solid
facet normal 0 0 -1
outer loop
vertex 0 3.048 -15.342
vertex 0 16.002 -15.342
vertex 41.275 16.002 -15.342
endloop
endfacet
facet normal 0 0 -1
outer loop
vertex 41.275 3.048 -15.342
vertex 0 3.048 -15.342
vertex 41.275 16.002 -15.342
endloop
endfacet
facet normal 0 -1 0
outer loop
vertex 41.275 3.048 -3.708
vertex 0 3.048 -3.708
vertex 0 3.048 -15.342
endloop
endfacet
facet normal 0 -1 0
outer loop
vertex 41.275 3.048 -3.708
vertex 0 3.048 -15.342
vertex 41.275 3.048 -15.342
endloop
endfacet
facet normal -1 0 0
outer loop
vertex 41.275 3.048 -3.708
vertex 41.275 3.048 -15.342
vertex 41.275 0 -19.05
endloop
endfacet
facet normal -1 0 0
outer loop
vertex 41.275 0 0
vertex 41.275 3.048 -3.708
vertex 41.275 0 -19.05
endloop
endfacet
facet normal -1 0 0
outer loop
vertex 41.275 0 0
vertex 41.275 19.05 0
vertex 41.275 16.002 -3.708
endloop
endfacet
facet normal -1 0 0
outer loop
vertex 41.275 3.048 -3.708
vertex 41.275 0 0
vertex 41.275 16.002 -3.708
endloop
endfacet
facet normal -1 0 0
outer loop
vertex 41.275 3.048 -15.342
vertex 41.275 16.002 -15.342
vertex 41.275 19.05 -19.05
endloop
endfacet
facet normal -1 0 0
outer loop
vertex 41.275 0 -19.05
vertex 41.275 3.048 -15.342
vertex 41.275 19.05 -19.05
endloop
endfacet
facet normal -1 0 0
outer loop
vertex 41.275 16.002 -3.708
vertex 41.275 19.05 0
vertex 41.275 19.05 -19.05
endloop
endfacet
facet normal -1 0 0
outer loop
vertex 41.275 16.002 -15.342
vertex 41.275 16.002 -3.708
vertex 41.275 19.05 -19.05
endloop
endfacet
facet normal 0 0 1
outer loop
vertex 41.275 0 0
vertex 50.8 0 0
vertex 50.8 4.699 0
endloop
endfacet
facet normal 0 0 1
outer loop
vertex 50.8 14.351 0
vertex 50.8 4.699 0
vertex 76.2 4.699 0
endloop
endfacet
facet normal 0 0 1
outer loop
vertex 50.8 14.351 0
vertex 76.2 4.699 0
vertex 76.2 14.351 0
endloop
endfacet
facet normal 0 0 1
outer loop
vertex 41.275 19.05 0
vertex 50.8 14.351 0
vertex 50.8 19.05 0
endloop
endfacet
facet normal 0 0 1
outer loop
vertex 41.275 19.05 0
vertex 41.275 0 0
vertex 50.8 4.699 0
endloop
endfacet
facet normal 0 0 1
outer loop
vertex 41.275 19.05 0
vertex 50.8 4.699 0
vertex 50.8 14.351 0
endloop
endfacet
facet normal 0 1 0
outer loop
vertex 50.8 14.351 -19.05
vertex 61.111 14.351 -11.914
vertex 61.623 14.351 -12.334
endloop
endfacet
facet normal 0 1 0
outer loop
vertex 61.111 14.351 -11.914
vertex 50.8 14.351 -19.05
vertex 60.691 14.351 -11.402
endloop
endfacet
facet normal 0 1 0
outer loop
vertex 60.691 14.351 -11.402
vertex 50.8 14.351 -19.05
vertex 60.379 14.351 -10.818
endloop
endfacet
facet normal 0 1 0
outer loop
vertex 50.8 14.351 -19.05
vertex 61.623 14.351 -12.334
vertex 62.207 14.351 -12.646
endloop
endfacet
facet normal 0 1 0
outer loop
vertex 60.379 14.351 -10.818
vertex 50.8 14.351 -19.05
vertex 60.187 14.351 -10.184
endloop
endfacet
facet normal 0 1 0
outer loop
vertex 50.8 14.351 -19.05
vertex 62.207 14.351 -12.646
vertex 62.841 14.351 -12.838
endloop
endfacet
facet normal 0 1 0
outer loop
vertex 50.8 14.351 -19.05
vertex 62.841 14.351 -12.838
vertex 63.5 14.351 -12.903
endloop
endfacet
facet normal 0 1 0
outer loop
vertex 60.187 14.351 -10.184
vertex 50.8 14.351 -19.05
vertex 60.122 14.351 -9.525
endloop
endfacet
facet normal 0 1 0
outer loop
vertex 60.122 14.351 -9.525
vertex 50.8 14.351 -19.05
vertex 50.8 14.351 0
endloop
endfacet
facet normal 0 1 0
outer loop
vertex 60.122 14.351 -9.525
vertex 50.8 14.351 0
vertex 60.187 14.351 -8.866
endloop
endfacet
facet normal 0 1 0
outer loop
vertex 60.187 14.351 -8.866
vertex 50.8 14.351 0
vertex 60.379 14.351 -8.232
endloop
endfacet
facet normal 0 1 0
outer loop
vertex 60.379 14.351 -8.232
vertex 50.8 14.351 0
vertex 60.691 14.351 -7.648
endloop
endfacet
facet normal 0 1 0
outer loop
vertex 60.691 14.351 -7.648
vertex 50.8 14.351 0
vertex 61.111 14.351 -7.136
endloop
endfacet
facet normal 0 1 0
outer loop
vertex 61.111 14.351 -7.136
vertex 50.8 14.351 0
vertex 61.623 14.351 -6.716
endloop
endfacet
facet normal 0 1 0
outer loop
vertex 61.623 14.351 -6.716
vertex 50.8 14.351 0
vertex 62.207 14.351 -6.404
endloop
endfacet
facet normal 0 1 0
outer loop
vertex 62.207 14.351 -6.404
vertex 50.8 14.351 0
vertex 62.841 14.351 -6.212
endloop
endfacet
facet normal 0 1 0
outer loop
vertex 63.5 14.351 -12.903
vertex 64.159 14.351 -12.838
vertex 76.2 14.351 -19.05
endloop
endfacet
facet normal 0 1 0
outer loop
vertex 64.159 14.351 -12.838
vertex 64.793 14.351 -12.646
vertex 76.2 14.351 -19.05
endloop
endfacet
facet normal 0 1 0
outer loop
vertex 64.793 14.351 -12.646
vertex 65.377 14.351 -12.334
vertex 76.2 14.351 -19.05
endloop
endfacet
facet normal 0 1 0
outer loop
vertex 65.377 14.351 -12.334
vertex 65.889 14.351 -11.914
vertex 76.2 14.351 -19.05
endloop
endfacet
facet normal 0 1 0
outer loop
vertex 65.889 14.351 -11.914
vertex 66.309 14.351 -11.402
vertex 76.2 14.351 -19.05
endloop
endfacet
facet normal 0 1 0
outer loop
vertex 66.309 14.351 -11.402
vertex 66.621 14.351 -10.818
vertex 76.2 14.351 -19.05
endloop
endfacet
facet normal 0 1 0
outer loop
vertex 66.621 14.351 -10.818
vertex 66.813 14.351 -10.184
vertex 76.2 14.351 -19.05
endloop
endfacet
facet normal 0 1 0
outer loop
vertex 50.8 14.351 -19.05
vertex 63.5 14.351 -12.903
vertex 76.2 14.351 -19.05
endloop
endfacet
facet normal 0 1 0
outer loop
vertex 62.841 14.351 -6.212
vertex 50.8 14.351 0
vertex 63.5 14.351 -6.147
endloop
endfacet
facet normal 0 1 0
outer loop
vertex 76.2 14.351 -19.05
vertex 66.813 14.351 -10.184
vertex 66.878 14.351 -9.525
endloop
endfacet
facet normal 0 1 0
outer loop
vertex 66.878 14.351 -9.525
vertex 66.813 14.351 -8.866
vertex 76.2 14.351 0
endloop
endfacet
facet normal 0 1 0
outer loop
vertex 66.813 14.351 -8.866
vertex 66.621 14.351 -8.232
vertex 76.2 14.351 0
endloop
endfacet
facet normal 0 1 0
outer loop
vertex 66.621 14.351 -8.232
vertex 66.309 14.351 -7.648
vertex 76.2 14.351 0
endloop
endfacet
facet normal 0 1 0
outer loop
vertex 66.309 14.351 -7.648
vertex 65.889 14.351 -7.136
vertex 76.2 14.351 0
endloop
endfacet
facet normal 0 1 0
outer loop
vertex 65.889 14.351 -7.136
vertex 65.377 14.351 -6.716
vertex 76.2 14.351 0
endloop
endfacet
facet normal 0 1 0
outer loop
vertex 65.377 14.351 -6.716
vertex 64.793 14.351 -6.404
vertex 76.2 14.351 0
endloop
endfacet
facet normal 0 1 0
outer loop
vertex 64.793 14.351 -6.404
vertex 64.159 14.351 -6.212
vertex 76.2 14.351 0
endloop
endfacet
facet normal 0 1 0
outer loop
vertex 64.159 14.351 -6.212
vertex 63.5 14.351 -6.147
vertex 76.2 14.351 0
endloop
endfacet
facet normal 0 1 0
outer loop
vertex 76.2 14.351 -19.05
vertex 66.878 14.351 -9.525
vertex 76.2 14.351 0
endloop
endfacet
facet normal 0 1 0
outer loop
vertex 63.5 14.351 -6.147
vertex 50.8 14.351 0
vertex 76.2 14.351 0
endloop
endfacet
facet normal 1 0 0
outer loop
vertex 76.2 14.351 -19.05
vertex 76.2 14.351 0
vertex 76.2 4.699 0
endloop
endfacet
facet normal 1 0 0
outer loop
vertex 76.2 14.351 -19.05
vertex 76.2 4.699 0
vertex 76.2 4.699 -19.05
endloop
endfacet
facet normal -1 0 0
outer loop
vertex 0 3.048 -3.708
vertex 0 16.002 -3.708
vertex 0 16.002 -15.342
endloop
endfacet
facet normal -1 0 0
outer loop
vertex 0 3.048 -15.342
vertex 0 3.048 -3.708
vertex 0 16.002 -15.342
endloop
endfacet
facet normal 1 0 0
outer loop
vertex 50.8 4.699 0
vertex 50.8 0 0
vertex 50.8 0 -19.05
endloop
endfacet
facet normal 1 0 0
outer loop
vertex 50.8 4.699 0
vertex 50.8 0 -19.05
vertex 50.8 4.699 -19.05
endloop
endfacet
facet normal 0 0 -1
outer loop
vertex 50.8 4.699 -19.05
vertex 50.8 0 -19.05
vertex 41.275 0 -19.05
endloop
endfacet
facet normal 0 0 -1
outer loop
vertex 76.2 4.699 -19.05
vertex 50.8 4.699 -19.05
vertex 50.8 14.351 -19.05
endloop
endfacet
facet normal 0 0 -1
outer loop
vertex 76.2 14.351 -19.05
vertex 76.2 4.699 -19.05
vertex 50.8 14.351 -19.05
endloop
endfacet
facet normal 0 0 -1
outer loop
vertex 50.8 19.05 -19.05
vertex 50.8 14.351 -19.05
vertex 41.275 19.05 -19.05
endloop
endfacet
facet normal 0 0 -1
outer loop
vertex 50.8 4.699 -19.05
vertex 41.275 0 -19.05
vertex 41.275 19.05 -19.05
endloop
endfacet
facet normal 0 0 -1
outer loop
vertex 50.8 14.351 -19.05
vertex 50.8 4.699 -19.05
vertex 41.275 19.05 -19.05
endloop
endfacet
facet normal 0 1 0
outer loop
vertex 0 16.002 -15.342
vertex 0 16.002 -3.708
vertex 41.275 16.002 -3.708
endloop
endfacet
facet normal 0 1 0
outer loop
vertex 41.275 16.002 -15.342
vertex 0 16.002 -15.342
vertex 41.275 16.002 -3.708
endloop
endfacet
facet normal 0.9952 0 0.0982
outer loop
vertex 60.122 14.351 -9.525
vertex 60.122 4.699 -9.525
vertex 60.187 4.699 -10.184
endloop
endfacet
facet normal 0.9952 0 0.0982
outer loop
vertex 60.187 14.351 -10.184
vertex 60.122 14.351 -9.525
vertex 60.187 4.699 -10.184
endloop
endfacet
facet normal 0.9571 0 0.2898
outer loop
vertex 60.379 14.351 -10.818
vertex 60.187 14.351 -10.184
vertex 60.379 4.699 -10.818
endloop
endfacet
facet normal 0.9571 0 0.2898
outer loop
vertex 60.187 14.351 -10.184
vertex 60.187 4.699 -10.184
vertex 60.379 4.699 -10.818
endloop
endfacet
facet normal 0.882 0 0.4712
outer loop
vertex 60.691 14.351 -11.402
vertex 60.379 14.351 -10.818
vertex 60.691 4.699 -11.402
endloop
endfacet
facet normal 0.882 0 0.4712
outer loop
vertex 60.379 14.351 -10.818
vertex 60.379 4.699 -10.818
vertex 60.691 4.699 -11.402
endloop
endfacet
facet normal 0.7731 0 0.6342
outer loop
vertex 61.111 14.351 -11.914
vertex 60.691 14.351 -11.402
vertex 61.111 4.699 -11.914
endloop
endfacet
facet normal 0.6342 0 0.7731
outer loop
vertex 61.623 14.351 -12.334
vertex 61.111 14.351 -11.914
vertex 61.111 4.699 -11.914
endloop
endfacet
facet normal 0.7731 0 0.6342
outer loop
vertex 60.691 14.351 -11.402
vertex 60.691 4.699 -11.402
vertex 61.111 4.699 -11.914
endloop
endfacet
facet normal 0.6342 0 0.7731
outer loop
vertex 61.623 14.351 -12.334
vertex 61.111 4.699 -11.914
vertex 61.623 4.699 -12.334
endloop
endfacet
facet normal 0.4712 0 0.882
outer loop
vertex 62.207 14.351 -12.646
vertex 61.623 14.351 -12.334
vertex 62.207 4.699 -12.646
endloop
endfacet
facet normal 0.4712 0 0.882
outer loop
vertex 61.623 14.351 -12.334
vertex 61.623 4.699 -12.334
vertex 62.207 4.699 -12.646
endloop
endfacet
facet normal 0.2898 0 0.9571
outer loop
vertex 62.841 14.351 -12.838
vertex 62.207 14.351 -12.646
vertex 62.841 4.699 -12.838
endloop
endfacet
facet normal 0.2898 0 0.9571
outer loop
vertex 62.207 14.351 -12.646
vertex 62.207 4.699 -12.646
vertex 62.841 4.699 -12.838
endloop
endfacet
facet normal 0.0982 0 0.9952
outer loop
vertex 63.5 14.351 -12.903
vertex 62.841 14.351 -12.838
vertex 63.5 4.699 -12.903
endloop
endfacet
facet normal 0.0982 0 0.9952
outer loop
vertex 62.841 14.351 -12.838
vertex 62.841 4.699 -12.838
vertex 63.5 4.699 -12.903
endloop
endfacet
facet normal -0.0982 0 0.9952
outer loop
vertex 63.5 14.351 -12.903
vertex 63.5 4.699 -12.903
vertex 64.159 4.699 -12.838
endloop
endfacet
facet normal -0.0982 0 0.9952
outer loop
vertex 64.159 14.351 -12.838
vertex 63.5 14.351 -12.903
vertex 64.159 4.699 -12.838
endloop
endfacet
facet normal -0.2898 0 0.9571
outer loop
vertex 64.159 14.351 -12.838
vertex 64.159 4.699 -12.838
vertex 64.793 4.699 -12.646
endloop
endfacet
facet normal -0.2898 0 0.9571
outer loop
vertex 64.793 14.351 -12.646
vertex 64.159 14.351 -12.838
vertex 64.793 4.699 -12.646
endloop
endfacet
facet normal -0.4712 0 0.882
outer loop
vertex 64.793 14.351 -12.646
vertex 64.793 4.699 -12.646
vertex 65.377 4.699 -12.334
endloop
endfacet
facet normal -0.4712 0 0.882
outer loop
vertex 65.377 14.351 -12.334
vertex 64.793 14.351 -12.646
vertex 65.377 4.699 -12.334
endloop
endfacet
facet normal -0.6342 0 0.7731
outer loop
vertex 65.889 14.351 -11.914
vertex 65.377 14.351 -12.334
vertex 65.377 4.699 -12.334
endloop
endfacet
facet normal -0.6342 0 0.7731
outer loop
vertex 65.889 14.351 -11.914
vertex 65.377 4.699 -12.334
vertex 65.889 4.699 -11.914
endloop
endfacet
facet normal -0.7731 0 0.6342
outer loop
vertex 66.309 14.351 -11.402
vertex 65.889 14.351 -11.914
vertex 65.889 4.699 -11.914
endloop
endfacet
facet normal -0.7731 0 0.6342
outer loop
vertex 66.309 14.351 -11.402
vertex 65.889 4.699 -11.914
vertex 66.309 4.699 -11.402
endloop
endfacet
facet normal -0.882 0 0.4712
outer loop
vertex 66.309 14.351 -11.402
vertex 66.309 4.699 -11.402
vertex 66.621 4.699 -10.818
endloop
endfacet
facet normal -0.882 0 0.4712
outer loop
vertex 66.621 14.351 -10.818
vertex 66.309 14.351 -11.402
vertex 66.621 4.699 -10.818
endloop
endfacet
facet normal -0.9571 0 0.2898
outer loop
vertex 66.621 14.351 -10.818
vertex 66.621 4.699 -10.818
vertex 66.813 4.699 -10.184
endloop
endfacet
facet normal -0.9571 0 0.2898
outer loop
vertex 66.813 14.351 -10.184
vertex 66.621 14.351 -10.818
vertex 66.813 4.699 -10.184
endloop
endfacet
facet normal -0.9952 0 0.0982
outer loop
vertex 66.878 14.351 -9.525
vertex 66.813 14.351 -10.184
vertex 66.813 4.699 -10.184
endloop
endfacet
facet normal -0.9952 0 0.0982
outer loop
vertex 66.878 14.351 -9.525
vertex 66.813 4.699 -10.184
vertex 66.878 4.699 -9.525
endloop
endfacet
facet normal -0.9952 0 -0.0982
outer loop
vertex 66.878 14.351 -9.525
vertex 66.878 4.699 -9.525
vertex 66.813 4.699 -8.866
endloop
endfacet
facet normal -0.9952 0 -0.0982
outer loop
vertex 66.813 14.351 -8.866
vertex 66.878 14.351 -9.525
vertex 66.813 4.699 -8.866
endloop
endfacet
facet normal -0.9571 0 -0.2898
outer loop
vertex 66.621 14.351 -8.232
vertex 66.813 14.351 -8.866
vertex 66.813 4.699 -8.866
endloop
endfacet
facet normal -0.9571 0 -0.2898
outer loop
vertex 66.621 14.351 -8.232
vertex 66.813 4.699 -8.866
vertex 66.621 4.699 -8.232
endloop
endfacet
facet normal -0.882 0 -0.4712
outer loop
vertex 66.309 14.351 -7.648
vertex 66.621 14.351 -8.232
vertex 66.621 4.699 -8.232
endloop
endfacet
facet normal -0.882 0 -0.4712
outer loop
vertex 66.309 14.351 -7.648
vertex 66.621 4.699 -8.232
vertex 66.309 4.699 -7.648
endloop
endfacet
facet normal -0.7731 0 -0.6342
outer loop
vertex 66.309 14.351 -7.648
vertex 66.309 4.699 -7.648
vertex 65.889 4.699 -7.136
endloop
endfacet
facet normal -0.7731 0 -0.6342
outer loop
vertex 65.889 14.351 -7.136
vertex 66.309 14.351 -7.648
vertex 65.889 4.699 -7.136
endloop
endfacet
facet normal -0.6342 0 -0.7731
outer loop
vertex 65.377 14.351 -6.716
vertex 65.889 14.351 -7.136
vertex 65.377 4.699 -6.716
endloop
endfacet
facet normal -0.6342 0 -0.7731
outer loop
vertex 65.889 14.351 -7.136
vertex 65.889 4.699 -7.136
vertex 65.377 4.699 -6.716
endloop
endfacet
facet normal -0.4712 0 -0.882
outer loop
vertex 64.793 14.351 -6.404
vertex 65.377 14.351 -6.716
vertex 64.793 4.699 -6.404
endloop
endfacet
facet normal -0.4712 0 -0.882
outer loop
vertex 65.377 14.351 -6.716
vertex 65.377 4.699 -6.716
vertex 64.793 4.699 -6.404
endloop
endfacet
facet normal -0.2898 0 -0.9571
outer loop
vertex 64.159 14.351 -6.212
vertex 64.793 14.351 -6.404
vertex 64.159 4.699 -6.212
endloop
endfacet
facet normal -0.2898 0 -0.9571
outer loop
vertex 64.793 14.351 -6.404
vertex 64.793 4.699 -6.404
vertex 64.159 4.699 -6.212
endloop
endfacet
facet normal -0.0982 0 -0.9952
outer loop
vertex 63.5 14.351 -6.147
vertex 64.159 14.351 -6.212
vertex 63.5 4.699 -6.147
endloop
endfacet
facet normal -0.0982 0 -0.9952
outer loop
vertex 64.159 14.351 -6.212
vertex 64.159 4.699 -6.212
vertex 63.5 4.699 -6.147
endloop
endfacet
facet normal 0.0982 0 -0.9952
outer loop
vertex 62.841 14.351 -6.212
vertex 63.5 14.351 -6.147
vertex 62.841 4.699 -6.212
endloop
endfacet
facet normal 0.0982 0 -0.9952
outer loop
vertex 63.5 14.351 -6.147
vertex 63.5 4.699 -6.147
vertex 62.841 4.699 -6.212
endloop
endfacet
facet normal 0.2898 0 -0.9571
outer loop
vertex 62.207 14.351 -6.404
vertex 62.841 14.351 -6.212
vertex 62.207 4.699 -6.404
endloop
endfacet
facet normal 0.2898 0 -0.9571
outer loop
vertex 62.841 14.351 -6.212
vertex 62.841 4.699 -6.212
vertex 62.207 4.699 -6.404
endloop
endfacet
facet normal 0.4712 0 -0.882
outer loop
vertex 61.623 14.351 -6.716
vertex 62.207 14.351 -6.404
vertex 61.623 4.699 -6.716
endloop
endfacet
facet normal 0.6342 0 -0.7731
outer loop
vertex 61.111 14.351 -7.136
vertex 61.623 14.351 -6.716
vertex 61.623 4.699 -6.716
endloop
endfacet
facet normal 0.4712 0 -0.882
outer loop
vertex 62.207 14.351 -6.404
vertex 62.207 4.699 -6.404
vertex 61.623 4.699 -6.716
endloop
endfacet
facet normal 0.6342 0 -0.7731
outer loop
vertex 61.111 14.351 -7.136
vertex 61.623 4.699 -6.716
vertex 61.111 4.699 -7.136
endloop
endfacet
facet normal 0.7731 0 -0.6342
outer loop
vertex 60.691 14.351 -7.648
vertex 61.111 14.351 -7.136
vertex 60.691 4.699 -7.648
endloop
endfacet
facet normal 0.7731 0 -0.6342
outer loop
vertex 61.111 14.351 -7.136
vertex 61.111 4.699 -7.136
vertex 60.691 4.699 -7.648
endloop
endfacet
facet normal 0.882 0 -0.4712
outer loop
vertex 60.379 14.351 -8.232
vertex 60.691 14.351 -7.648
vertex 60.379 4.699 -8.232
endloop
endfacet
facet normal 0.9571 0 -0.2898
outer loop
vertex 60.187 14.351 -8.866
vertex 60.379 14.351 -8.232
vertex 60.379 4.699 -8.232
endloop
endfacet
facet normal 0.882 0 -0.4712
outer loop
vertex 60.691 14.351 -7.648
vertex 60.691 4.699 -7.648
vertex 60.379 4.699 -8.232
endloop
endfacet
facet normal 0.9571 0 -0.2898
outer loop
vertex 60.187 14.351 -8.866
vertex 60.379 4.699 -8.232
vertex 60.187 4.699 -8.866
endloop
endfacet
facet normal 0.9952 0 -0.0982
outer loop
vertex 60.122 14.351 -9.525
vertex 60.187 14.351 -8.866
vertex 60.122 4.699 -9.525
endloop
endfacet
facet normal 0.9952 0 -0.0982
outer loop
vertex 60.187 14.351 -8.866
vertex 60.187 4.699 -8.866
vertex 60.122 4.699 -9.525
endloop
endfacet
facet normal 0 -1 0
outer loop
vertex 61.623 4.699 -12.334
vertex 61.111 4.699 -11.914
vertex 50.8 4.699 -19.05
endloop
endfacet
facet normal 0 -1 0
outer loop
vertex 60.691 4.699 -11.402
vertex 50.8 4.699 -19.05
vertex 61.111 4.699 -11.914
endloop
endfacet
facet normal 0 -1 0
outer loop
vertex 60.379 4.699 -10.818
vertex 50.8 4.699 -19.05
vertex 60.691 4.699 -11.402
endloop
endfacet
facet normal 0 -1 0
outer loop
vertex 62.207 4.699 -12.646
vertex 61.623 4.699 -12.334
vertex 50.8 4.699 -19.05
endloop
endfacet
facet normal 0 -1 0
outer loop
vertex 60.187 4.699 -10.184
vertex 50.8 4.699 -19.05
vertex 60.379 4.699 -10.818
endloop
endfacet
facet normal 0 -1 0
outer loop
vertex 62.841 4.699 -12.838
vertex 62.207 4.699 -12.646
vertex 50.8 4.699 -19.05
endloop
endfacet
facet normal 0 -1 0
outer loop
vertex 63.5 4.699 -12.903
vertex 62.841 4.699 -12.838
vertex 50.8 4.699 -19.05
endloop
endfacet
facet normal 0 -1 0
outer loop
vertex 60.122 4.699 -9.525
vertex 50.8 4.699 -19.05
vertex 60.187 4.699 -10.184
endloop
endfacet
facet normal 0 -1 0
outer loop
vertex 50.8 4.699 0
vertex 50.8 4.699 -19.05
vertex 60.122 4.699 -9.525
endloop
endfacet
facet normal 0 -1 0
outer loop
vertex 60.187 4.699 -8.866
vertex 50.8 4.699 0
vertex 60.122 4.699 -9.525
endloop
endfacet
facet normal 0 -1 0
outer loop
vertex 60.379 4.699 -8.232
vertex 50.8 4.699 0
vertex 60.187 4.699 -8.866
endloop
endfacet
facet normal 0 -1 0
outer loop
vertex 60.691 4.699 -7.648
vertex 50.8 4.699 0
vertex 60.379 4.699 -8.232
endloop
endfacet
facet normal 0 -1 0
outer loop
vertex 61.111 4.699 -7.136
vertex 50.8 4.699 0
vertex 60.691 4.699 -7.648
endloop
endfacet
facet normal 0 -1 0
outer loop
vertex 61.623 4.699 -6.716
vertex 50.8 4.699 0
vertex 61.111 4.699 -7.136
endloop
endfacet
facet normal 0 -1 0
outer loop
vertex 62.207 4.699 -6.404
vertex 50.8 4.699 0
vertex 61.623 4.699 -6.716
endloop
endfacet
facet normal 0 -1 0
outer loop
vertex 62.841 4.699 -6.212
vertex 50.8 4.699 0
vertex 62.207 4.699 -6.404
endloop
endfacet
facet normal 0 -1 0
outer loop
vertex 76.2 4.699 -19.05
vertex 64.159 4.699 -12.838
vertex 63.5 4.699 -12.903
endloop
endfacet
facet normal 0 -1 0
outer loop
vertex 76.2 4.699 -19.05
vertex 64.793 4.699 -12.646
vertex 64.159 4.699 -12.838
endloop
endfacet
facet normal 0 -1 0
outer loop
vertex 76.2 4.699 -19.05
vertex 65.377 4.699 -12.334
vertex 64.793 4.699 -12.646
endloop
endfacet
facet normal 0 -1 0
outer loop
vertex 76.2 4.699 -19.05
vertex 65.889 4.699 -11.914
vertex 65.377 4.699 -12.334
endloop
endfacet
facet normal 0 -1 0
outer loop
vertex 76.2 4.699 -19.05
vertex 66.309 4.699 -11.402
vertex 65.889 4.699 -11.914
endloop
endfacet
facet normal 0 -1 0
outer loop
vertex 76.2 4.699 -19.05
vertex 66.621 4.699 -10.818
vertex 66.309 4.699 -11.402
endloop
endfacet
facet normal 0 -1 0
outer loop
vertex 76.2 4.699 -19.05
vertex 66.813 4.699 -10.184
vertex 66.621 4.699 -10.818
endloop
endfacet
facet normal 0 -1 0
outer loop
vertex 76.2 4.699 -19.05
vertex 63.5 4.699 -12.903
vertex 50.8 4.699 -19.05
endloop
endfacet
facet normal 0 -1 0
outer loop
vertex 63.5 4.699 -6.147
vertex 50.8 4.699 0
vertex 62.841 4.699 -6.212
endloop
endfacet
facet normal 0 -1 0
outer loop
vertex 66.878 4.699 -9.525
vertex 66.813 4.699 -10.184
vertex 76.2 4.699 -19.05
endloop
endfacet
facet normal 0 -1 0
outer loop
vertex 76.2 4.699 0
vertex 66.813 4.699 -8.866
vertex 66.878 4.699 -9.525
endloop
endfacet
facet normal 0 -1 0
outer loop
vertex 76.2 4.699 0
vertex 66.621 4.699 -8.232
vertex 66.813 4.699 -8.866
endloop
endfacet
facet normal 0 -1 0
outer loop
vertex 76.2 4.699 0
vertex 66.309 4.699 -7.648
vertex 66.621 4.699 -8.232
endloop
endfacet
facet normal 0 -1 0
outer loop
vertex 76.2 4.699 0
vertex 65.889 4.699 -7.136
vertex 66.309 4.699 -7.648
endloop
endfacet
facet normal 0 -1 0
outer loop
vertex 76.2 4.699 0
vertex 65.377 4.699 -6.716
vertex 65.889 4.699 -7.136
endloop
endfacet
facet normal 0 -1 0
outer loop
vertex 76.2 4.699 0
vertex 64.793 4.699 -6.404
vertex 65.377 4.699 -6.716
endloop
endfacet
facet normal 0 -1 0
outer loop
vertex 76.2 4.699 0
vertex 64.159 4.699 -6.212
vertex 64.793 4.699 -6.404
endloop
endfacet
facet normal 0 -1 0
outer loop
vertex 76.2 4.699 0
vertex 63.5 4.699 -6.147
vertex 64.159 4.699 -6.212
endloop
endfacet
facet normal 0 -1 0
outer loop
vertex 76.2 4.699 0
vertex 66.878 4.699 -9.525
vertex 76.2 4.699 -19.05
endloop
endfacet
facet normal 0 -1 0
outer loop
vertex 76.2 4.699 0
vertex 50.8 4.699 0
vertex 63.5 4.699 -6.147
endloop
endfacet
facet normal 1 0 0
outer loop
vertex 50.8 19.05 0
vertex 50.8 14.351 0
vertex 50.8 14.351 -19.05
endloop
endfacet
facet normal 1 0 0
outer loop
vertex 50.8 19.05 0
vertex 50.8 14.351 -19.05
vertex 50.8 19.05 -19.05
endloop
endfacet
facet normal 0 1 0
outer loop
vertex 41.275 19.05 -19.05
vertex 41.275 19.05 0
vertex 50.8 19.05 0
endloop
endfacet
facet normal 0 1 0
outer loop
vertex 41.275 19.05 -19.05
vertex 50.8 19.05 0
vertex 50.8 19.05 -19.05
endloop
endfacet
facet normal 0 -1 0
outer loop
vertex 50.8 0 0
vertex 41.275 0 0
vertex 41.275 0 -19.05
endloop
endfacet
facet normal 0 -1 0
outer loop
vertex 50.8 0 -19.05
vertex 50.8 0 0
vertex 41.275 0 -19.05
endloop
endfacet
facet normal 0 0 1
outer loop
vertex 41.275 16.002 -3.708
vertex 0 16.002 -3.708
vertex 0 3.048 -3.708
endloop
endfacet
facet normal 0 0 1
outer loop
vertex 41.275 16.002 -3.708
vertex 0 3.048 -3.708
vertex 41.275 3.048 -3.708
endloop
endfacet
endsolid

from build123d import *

# Parameters (mm, degrees)
SKETCH1_W               = 19.05
SKETCH1_H               = 19.05
BOSS_EXTRUDE1_DEPTH     = 76.2
SKETCH2_W               = 25.4
SKETCH2_H               = 4.699
CUT_EXTRUDE1_DEPTH      = 81.82230509
SKETCH3_W               = 41.275
SKETCH3_H               = 3.048
CUT_EXTRUDE2_DEPTH      = 81.82230509
SKETCH4_W               = 41.275
SKETCH4_H               = 3.7084
CUT_EXTRUDE3_DEPTH      = 81.158633372
F_1_4_CLEARANCE_HOLE1_D = 6.7564


with BuildPart() as part:
    # Sketch1 → Boss-Extrude1 (new body)
    with BuildSketch(Plane(origin=(0, 0, 0), x_dir=(0, 0, -1), z_dir=(1, 0, 0))):
        with Locations((9.525, 9.525)):
            Rectangle(SKETCH1_W, SKETCH1_H)
    extrude(amount=BOSS_EXTRUDE1_DEPTH)

    # Sketch2 → Cut-Extrude1 (cut, through all)
    with BuildSketch(Plane.XY):
        with Locations((63.5, 16.7005)):
            Rectangle(SKETCH2_W, SKETCH2_H)
        with Locations((63.5, 2.3495)):
            Rectangle(SKETCH2_W, SKETCH2_H)
    extrude(amount=-CUT_EXTRUDE1_DEPTH, mode=Mode.SUBTRACT)

    # Sketch3 → Cut-Extrude2 (cut, through all)
    with BuildSketch(Plane.XY):
        with Locations((20.6375, 17.526)):
            Rectangle(SKETCH3_W, SKETCH3_H)
        with Locations((20.6375, 1.524)):
            Rectangle(SKETCH3_W, SKETCH3_H)
    extrude(amount=-CUT_EXTRUDE2_DEPTH, mode=Mode.SUBTRACT)

    # Sketch4 → Cut-Extrude3 (cut, through all)
    with BuildSketch(Plane(origin=(0, 16.002, 0), x_dir=(1, 0, 0), z_dir=(0, 1, 0))):
        with Locations((20.6375, 17.1958)):
            Rectangle(SKETCH4_W, SKETCH4_H)
        with Locations((20.6375, 1.8542)):
            Rectangle(SKETCH4_W, SKETCH4_H)
    extrude(amount=-CUT_EXTRUDE3_DEPTH, mode=Mode.SUBTRACT)

    # 1/4 Clearance Hole1 (through all)
    with Locations(Plane(origin=(0, 14.351, 0), x_dir=(1, 0, 0), z_dir=(0, 1, 0))):
        with Locations((63.5, 9.525)):
            Hole(F_1_4_CLEARANCE_HOLE1_D / 2)


solid = part.part
